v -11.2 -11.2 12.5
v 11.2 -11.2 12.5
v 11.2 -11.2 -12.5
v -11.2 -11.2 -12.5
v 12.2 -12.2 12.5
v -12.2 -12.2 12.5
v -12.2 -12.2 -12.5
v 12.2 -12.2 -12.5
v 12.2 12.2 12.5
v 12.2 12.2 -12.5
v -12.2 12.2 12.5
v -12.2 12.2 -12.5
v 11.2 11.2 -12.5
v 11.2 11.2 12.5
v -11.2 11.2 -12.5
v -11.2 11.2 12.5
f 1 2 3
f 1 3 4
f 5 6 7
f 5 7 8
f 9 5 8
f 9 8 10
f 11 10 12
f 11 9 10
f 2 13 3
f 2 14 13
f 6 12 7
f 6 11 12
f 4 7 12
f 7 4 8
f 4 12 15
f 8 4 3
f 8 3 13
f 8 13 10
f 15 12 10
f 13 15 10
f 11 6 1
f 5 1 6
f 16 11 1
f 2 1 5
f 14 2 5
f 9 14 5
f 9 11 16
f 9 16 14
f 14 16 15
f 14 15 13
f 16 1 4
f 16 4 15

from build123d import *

# Parameters (mm, degrees)
F1_DEPTH = 12.5


with BuildPart() as f1:
    # F0 (on Top) → F1 (new body, symmetric)
    with BuildSketch(Plane.XY):
        Polygon((0.01, 12.2), (-12.2, 12.2), (-12.2, -12.2), (12.2, -12.2), (12.2, -0.1), (12.2, 12.2), align=None)
        Polygon((11.2, -11.2), (-11.2, -11.2), (-11.2, 11.2), (0, 11.2), (11.2, 11.2), (11.2, 0), align=None, mode=Mode.SUBTRACT)
    extrude(amount=F1_DEPTH, both=True)


solid = f1.part
